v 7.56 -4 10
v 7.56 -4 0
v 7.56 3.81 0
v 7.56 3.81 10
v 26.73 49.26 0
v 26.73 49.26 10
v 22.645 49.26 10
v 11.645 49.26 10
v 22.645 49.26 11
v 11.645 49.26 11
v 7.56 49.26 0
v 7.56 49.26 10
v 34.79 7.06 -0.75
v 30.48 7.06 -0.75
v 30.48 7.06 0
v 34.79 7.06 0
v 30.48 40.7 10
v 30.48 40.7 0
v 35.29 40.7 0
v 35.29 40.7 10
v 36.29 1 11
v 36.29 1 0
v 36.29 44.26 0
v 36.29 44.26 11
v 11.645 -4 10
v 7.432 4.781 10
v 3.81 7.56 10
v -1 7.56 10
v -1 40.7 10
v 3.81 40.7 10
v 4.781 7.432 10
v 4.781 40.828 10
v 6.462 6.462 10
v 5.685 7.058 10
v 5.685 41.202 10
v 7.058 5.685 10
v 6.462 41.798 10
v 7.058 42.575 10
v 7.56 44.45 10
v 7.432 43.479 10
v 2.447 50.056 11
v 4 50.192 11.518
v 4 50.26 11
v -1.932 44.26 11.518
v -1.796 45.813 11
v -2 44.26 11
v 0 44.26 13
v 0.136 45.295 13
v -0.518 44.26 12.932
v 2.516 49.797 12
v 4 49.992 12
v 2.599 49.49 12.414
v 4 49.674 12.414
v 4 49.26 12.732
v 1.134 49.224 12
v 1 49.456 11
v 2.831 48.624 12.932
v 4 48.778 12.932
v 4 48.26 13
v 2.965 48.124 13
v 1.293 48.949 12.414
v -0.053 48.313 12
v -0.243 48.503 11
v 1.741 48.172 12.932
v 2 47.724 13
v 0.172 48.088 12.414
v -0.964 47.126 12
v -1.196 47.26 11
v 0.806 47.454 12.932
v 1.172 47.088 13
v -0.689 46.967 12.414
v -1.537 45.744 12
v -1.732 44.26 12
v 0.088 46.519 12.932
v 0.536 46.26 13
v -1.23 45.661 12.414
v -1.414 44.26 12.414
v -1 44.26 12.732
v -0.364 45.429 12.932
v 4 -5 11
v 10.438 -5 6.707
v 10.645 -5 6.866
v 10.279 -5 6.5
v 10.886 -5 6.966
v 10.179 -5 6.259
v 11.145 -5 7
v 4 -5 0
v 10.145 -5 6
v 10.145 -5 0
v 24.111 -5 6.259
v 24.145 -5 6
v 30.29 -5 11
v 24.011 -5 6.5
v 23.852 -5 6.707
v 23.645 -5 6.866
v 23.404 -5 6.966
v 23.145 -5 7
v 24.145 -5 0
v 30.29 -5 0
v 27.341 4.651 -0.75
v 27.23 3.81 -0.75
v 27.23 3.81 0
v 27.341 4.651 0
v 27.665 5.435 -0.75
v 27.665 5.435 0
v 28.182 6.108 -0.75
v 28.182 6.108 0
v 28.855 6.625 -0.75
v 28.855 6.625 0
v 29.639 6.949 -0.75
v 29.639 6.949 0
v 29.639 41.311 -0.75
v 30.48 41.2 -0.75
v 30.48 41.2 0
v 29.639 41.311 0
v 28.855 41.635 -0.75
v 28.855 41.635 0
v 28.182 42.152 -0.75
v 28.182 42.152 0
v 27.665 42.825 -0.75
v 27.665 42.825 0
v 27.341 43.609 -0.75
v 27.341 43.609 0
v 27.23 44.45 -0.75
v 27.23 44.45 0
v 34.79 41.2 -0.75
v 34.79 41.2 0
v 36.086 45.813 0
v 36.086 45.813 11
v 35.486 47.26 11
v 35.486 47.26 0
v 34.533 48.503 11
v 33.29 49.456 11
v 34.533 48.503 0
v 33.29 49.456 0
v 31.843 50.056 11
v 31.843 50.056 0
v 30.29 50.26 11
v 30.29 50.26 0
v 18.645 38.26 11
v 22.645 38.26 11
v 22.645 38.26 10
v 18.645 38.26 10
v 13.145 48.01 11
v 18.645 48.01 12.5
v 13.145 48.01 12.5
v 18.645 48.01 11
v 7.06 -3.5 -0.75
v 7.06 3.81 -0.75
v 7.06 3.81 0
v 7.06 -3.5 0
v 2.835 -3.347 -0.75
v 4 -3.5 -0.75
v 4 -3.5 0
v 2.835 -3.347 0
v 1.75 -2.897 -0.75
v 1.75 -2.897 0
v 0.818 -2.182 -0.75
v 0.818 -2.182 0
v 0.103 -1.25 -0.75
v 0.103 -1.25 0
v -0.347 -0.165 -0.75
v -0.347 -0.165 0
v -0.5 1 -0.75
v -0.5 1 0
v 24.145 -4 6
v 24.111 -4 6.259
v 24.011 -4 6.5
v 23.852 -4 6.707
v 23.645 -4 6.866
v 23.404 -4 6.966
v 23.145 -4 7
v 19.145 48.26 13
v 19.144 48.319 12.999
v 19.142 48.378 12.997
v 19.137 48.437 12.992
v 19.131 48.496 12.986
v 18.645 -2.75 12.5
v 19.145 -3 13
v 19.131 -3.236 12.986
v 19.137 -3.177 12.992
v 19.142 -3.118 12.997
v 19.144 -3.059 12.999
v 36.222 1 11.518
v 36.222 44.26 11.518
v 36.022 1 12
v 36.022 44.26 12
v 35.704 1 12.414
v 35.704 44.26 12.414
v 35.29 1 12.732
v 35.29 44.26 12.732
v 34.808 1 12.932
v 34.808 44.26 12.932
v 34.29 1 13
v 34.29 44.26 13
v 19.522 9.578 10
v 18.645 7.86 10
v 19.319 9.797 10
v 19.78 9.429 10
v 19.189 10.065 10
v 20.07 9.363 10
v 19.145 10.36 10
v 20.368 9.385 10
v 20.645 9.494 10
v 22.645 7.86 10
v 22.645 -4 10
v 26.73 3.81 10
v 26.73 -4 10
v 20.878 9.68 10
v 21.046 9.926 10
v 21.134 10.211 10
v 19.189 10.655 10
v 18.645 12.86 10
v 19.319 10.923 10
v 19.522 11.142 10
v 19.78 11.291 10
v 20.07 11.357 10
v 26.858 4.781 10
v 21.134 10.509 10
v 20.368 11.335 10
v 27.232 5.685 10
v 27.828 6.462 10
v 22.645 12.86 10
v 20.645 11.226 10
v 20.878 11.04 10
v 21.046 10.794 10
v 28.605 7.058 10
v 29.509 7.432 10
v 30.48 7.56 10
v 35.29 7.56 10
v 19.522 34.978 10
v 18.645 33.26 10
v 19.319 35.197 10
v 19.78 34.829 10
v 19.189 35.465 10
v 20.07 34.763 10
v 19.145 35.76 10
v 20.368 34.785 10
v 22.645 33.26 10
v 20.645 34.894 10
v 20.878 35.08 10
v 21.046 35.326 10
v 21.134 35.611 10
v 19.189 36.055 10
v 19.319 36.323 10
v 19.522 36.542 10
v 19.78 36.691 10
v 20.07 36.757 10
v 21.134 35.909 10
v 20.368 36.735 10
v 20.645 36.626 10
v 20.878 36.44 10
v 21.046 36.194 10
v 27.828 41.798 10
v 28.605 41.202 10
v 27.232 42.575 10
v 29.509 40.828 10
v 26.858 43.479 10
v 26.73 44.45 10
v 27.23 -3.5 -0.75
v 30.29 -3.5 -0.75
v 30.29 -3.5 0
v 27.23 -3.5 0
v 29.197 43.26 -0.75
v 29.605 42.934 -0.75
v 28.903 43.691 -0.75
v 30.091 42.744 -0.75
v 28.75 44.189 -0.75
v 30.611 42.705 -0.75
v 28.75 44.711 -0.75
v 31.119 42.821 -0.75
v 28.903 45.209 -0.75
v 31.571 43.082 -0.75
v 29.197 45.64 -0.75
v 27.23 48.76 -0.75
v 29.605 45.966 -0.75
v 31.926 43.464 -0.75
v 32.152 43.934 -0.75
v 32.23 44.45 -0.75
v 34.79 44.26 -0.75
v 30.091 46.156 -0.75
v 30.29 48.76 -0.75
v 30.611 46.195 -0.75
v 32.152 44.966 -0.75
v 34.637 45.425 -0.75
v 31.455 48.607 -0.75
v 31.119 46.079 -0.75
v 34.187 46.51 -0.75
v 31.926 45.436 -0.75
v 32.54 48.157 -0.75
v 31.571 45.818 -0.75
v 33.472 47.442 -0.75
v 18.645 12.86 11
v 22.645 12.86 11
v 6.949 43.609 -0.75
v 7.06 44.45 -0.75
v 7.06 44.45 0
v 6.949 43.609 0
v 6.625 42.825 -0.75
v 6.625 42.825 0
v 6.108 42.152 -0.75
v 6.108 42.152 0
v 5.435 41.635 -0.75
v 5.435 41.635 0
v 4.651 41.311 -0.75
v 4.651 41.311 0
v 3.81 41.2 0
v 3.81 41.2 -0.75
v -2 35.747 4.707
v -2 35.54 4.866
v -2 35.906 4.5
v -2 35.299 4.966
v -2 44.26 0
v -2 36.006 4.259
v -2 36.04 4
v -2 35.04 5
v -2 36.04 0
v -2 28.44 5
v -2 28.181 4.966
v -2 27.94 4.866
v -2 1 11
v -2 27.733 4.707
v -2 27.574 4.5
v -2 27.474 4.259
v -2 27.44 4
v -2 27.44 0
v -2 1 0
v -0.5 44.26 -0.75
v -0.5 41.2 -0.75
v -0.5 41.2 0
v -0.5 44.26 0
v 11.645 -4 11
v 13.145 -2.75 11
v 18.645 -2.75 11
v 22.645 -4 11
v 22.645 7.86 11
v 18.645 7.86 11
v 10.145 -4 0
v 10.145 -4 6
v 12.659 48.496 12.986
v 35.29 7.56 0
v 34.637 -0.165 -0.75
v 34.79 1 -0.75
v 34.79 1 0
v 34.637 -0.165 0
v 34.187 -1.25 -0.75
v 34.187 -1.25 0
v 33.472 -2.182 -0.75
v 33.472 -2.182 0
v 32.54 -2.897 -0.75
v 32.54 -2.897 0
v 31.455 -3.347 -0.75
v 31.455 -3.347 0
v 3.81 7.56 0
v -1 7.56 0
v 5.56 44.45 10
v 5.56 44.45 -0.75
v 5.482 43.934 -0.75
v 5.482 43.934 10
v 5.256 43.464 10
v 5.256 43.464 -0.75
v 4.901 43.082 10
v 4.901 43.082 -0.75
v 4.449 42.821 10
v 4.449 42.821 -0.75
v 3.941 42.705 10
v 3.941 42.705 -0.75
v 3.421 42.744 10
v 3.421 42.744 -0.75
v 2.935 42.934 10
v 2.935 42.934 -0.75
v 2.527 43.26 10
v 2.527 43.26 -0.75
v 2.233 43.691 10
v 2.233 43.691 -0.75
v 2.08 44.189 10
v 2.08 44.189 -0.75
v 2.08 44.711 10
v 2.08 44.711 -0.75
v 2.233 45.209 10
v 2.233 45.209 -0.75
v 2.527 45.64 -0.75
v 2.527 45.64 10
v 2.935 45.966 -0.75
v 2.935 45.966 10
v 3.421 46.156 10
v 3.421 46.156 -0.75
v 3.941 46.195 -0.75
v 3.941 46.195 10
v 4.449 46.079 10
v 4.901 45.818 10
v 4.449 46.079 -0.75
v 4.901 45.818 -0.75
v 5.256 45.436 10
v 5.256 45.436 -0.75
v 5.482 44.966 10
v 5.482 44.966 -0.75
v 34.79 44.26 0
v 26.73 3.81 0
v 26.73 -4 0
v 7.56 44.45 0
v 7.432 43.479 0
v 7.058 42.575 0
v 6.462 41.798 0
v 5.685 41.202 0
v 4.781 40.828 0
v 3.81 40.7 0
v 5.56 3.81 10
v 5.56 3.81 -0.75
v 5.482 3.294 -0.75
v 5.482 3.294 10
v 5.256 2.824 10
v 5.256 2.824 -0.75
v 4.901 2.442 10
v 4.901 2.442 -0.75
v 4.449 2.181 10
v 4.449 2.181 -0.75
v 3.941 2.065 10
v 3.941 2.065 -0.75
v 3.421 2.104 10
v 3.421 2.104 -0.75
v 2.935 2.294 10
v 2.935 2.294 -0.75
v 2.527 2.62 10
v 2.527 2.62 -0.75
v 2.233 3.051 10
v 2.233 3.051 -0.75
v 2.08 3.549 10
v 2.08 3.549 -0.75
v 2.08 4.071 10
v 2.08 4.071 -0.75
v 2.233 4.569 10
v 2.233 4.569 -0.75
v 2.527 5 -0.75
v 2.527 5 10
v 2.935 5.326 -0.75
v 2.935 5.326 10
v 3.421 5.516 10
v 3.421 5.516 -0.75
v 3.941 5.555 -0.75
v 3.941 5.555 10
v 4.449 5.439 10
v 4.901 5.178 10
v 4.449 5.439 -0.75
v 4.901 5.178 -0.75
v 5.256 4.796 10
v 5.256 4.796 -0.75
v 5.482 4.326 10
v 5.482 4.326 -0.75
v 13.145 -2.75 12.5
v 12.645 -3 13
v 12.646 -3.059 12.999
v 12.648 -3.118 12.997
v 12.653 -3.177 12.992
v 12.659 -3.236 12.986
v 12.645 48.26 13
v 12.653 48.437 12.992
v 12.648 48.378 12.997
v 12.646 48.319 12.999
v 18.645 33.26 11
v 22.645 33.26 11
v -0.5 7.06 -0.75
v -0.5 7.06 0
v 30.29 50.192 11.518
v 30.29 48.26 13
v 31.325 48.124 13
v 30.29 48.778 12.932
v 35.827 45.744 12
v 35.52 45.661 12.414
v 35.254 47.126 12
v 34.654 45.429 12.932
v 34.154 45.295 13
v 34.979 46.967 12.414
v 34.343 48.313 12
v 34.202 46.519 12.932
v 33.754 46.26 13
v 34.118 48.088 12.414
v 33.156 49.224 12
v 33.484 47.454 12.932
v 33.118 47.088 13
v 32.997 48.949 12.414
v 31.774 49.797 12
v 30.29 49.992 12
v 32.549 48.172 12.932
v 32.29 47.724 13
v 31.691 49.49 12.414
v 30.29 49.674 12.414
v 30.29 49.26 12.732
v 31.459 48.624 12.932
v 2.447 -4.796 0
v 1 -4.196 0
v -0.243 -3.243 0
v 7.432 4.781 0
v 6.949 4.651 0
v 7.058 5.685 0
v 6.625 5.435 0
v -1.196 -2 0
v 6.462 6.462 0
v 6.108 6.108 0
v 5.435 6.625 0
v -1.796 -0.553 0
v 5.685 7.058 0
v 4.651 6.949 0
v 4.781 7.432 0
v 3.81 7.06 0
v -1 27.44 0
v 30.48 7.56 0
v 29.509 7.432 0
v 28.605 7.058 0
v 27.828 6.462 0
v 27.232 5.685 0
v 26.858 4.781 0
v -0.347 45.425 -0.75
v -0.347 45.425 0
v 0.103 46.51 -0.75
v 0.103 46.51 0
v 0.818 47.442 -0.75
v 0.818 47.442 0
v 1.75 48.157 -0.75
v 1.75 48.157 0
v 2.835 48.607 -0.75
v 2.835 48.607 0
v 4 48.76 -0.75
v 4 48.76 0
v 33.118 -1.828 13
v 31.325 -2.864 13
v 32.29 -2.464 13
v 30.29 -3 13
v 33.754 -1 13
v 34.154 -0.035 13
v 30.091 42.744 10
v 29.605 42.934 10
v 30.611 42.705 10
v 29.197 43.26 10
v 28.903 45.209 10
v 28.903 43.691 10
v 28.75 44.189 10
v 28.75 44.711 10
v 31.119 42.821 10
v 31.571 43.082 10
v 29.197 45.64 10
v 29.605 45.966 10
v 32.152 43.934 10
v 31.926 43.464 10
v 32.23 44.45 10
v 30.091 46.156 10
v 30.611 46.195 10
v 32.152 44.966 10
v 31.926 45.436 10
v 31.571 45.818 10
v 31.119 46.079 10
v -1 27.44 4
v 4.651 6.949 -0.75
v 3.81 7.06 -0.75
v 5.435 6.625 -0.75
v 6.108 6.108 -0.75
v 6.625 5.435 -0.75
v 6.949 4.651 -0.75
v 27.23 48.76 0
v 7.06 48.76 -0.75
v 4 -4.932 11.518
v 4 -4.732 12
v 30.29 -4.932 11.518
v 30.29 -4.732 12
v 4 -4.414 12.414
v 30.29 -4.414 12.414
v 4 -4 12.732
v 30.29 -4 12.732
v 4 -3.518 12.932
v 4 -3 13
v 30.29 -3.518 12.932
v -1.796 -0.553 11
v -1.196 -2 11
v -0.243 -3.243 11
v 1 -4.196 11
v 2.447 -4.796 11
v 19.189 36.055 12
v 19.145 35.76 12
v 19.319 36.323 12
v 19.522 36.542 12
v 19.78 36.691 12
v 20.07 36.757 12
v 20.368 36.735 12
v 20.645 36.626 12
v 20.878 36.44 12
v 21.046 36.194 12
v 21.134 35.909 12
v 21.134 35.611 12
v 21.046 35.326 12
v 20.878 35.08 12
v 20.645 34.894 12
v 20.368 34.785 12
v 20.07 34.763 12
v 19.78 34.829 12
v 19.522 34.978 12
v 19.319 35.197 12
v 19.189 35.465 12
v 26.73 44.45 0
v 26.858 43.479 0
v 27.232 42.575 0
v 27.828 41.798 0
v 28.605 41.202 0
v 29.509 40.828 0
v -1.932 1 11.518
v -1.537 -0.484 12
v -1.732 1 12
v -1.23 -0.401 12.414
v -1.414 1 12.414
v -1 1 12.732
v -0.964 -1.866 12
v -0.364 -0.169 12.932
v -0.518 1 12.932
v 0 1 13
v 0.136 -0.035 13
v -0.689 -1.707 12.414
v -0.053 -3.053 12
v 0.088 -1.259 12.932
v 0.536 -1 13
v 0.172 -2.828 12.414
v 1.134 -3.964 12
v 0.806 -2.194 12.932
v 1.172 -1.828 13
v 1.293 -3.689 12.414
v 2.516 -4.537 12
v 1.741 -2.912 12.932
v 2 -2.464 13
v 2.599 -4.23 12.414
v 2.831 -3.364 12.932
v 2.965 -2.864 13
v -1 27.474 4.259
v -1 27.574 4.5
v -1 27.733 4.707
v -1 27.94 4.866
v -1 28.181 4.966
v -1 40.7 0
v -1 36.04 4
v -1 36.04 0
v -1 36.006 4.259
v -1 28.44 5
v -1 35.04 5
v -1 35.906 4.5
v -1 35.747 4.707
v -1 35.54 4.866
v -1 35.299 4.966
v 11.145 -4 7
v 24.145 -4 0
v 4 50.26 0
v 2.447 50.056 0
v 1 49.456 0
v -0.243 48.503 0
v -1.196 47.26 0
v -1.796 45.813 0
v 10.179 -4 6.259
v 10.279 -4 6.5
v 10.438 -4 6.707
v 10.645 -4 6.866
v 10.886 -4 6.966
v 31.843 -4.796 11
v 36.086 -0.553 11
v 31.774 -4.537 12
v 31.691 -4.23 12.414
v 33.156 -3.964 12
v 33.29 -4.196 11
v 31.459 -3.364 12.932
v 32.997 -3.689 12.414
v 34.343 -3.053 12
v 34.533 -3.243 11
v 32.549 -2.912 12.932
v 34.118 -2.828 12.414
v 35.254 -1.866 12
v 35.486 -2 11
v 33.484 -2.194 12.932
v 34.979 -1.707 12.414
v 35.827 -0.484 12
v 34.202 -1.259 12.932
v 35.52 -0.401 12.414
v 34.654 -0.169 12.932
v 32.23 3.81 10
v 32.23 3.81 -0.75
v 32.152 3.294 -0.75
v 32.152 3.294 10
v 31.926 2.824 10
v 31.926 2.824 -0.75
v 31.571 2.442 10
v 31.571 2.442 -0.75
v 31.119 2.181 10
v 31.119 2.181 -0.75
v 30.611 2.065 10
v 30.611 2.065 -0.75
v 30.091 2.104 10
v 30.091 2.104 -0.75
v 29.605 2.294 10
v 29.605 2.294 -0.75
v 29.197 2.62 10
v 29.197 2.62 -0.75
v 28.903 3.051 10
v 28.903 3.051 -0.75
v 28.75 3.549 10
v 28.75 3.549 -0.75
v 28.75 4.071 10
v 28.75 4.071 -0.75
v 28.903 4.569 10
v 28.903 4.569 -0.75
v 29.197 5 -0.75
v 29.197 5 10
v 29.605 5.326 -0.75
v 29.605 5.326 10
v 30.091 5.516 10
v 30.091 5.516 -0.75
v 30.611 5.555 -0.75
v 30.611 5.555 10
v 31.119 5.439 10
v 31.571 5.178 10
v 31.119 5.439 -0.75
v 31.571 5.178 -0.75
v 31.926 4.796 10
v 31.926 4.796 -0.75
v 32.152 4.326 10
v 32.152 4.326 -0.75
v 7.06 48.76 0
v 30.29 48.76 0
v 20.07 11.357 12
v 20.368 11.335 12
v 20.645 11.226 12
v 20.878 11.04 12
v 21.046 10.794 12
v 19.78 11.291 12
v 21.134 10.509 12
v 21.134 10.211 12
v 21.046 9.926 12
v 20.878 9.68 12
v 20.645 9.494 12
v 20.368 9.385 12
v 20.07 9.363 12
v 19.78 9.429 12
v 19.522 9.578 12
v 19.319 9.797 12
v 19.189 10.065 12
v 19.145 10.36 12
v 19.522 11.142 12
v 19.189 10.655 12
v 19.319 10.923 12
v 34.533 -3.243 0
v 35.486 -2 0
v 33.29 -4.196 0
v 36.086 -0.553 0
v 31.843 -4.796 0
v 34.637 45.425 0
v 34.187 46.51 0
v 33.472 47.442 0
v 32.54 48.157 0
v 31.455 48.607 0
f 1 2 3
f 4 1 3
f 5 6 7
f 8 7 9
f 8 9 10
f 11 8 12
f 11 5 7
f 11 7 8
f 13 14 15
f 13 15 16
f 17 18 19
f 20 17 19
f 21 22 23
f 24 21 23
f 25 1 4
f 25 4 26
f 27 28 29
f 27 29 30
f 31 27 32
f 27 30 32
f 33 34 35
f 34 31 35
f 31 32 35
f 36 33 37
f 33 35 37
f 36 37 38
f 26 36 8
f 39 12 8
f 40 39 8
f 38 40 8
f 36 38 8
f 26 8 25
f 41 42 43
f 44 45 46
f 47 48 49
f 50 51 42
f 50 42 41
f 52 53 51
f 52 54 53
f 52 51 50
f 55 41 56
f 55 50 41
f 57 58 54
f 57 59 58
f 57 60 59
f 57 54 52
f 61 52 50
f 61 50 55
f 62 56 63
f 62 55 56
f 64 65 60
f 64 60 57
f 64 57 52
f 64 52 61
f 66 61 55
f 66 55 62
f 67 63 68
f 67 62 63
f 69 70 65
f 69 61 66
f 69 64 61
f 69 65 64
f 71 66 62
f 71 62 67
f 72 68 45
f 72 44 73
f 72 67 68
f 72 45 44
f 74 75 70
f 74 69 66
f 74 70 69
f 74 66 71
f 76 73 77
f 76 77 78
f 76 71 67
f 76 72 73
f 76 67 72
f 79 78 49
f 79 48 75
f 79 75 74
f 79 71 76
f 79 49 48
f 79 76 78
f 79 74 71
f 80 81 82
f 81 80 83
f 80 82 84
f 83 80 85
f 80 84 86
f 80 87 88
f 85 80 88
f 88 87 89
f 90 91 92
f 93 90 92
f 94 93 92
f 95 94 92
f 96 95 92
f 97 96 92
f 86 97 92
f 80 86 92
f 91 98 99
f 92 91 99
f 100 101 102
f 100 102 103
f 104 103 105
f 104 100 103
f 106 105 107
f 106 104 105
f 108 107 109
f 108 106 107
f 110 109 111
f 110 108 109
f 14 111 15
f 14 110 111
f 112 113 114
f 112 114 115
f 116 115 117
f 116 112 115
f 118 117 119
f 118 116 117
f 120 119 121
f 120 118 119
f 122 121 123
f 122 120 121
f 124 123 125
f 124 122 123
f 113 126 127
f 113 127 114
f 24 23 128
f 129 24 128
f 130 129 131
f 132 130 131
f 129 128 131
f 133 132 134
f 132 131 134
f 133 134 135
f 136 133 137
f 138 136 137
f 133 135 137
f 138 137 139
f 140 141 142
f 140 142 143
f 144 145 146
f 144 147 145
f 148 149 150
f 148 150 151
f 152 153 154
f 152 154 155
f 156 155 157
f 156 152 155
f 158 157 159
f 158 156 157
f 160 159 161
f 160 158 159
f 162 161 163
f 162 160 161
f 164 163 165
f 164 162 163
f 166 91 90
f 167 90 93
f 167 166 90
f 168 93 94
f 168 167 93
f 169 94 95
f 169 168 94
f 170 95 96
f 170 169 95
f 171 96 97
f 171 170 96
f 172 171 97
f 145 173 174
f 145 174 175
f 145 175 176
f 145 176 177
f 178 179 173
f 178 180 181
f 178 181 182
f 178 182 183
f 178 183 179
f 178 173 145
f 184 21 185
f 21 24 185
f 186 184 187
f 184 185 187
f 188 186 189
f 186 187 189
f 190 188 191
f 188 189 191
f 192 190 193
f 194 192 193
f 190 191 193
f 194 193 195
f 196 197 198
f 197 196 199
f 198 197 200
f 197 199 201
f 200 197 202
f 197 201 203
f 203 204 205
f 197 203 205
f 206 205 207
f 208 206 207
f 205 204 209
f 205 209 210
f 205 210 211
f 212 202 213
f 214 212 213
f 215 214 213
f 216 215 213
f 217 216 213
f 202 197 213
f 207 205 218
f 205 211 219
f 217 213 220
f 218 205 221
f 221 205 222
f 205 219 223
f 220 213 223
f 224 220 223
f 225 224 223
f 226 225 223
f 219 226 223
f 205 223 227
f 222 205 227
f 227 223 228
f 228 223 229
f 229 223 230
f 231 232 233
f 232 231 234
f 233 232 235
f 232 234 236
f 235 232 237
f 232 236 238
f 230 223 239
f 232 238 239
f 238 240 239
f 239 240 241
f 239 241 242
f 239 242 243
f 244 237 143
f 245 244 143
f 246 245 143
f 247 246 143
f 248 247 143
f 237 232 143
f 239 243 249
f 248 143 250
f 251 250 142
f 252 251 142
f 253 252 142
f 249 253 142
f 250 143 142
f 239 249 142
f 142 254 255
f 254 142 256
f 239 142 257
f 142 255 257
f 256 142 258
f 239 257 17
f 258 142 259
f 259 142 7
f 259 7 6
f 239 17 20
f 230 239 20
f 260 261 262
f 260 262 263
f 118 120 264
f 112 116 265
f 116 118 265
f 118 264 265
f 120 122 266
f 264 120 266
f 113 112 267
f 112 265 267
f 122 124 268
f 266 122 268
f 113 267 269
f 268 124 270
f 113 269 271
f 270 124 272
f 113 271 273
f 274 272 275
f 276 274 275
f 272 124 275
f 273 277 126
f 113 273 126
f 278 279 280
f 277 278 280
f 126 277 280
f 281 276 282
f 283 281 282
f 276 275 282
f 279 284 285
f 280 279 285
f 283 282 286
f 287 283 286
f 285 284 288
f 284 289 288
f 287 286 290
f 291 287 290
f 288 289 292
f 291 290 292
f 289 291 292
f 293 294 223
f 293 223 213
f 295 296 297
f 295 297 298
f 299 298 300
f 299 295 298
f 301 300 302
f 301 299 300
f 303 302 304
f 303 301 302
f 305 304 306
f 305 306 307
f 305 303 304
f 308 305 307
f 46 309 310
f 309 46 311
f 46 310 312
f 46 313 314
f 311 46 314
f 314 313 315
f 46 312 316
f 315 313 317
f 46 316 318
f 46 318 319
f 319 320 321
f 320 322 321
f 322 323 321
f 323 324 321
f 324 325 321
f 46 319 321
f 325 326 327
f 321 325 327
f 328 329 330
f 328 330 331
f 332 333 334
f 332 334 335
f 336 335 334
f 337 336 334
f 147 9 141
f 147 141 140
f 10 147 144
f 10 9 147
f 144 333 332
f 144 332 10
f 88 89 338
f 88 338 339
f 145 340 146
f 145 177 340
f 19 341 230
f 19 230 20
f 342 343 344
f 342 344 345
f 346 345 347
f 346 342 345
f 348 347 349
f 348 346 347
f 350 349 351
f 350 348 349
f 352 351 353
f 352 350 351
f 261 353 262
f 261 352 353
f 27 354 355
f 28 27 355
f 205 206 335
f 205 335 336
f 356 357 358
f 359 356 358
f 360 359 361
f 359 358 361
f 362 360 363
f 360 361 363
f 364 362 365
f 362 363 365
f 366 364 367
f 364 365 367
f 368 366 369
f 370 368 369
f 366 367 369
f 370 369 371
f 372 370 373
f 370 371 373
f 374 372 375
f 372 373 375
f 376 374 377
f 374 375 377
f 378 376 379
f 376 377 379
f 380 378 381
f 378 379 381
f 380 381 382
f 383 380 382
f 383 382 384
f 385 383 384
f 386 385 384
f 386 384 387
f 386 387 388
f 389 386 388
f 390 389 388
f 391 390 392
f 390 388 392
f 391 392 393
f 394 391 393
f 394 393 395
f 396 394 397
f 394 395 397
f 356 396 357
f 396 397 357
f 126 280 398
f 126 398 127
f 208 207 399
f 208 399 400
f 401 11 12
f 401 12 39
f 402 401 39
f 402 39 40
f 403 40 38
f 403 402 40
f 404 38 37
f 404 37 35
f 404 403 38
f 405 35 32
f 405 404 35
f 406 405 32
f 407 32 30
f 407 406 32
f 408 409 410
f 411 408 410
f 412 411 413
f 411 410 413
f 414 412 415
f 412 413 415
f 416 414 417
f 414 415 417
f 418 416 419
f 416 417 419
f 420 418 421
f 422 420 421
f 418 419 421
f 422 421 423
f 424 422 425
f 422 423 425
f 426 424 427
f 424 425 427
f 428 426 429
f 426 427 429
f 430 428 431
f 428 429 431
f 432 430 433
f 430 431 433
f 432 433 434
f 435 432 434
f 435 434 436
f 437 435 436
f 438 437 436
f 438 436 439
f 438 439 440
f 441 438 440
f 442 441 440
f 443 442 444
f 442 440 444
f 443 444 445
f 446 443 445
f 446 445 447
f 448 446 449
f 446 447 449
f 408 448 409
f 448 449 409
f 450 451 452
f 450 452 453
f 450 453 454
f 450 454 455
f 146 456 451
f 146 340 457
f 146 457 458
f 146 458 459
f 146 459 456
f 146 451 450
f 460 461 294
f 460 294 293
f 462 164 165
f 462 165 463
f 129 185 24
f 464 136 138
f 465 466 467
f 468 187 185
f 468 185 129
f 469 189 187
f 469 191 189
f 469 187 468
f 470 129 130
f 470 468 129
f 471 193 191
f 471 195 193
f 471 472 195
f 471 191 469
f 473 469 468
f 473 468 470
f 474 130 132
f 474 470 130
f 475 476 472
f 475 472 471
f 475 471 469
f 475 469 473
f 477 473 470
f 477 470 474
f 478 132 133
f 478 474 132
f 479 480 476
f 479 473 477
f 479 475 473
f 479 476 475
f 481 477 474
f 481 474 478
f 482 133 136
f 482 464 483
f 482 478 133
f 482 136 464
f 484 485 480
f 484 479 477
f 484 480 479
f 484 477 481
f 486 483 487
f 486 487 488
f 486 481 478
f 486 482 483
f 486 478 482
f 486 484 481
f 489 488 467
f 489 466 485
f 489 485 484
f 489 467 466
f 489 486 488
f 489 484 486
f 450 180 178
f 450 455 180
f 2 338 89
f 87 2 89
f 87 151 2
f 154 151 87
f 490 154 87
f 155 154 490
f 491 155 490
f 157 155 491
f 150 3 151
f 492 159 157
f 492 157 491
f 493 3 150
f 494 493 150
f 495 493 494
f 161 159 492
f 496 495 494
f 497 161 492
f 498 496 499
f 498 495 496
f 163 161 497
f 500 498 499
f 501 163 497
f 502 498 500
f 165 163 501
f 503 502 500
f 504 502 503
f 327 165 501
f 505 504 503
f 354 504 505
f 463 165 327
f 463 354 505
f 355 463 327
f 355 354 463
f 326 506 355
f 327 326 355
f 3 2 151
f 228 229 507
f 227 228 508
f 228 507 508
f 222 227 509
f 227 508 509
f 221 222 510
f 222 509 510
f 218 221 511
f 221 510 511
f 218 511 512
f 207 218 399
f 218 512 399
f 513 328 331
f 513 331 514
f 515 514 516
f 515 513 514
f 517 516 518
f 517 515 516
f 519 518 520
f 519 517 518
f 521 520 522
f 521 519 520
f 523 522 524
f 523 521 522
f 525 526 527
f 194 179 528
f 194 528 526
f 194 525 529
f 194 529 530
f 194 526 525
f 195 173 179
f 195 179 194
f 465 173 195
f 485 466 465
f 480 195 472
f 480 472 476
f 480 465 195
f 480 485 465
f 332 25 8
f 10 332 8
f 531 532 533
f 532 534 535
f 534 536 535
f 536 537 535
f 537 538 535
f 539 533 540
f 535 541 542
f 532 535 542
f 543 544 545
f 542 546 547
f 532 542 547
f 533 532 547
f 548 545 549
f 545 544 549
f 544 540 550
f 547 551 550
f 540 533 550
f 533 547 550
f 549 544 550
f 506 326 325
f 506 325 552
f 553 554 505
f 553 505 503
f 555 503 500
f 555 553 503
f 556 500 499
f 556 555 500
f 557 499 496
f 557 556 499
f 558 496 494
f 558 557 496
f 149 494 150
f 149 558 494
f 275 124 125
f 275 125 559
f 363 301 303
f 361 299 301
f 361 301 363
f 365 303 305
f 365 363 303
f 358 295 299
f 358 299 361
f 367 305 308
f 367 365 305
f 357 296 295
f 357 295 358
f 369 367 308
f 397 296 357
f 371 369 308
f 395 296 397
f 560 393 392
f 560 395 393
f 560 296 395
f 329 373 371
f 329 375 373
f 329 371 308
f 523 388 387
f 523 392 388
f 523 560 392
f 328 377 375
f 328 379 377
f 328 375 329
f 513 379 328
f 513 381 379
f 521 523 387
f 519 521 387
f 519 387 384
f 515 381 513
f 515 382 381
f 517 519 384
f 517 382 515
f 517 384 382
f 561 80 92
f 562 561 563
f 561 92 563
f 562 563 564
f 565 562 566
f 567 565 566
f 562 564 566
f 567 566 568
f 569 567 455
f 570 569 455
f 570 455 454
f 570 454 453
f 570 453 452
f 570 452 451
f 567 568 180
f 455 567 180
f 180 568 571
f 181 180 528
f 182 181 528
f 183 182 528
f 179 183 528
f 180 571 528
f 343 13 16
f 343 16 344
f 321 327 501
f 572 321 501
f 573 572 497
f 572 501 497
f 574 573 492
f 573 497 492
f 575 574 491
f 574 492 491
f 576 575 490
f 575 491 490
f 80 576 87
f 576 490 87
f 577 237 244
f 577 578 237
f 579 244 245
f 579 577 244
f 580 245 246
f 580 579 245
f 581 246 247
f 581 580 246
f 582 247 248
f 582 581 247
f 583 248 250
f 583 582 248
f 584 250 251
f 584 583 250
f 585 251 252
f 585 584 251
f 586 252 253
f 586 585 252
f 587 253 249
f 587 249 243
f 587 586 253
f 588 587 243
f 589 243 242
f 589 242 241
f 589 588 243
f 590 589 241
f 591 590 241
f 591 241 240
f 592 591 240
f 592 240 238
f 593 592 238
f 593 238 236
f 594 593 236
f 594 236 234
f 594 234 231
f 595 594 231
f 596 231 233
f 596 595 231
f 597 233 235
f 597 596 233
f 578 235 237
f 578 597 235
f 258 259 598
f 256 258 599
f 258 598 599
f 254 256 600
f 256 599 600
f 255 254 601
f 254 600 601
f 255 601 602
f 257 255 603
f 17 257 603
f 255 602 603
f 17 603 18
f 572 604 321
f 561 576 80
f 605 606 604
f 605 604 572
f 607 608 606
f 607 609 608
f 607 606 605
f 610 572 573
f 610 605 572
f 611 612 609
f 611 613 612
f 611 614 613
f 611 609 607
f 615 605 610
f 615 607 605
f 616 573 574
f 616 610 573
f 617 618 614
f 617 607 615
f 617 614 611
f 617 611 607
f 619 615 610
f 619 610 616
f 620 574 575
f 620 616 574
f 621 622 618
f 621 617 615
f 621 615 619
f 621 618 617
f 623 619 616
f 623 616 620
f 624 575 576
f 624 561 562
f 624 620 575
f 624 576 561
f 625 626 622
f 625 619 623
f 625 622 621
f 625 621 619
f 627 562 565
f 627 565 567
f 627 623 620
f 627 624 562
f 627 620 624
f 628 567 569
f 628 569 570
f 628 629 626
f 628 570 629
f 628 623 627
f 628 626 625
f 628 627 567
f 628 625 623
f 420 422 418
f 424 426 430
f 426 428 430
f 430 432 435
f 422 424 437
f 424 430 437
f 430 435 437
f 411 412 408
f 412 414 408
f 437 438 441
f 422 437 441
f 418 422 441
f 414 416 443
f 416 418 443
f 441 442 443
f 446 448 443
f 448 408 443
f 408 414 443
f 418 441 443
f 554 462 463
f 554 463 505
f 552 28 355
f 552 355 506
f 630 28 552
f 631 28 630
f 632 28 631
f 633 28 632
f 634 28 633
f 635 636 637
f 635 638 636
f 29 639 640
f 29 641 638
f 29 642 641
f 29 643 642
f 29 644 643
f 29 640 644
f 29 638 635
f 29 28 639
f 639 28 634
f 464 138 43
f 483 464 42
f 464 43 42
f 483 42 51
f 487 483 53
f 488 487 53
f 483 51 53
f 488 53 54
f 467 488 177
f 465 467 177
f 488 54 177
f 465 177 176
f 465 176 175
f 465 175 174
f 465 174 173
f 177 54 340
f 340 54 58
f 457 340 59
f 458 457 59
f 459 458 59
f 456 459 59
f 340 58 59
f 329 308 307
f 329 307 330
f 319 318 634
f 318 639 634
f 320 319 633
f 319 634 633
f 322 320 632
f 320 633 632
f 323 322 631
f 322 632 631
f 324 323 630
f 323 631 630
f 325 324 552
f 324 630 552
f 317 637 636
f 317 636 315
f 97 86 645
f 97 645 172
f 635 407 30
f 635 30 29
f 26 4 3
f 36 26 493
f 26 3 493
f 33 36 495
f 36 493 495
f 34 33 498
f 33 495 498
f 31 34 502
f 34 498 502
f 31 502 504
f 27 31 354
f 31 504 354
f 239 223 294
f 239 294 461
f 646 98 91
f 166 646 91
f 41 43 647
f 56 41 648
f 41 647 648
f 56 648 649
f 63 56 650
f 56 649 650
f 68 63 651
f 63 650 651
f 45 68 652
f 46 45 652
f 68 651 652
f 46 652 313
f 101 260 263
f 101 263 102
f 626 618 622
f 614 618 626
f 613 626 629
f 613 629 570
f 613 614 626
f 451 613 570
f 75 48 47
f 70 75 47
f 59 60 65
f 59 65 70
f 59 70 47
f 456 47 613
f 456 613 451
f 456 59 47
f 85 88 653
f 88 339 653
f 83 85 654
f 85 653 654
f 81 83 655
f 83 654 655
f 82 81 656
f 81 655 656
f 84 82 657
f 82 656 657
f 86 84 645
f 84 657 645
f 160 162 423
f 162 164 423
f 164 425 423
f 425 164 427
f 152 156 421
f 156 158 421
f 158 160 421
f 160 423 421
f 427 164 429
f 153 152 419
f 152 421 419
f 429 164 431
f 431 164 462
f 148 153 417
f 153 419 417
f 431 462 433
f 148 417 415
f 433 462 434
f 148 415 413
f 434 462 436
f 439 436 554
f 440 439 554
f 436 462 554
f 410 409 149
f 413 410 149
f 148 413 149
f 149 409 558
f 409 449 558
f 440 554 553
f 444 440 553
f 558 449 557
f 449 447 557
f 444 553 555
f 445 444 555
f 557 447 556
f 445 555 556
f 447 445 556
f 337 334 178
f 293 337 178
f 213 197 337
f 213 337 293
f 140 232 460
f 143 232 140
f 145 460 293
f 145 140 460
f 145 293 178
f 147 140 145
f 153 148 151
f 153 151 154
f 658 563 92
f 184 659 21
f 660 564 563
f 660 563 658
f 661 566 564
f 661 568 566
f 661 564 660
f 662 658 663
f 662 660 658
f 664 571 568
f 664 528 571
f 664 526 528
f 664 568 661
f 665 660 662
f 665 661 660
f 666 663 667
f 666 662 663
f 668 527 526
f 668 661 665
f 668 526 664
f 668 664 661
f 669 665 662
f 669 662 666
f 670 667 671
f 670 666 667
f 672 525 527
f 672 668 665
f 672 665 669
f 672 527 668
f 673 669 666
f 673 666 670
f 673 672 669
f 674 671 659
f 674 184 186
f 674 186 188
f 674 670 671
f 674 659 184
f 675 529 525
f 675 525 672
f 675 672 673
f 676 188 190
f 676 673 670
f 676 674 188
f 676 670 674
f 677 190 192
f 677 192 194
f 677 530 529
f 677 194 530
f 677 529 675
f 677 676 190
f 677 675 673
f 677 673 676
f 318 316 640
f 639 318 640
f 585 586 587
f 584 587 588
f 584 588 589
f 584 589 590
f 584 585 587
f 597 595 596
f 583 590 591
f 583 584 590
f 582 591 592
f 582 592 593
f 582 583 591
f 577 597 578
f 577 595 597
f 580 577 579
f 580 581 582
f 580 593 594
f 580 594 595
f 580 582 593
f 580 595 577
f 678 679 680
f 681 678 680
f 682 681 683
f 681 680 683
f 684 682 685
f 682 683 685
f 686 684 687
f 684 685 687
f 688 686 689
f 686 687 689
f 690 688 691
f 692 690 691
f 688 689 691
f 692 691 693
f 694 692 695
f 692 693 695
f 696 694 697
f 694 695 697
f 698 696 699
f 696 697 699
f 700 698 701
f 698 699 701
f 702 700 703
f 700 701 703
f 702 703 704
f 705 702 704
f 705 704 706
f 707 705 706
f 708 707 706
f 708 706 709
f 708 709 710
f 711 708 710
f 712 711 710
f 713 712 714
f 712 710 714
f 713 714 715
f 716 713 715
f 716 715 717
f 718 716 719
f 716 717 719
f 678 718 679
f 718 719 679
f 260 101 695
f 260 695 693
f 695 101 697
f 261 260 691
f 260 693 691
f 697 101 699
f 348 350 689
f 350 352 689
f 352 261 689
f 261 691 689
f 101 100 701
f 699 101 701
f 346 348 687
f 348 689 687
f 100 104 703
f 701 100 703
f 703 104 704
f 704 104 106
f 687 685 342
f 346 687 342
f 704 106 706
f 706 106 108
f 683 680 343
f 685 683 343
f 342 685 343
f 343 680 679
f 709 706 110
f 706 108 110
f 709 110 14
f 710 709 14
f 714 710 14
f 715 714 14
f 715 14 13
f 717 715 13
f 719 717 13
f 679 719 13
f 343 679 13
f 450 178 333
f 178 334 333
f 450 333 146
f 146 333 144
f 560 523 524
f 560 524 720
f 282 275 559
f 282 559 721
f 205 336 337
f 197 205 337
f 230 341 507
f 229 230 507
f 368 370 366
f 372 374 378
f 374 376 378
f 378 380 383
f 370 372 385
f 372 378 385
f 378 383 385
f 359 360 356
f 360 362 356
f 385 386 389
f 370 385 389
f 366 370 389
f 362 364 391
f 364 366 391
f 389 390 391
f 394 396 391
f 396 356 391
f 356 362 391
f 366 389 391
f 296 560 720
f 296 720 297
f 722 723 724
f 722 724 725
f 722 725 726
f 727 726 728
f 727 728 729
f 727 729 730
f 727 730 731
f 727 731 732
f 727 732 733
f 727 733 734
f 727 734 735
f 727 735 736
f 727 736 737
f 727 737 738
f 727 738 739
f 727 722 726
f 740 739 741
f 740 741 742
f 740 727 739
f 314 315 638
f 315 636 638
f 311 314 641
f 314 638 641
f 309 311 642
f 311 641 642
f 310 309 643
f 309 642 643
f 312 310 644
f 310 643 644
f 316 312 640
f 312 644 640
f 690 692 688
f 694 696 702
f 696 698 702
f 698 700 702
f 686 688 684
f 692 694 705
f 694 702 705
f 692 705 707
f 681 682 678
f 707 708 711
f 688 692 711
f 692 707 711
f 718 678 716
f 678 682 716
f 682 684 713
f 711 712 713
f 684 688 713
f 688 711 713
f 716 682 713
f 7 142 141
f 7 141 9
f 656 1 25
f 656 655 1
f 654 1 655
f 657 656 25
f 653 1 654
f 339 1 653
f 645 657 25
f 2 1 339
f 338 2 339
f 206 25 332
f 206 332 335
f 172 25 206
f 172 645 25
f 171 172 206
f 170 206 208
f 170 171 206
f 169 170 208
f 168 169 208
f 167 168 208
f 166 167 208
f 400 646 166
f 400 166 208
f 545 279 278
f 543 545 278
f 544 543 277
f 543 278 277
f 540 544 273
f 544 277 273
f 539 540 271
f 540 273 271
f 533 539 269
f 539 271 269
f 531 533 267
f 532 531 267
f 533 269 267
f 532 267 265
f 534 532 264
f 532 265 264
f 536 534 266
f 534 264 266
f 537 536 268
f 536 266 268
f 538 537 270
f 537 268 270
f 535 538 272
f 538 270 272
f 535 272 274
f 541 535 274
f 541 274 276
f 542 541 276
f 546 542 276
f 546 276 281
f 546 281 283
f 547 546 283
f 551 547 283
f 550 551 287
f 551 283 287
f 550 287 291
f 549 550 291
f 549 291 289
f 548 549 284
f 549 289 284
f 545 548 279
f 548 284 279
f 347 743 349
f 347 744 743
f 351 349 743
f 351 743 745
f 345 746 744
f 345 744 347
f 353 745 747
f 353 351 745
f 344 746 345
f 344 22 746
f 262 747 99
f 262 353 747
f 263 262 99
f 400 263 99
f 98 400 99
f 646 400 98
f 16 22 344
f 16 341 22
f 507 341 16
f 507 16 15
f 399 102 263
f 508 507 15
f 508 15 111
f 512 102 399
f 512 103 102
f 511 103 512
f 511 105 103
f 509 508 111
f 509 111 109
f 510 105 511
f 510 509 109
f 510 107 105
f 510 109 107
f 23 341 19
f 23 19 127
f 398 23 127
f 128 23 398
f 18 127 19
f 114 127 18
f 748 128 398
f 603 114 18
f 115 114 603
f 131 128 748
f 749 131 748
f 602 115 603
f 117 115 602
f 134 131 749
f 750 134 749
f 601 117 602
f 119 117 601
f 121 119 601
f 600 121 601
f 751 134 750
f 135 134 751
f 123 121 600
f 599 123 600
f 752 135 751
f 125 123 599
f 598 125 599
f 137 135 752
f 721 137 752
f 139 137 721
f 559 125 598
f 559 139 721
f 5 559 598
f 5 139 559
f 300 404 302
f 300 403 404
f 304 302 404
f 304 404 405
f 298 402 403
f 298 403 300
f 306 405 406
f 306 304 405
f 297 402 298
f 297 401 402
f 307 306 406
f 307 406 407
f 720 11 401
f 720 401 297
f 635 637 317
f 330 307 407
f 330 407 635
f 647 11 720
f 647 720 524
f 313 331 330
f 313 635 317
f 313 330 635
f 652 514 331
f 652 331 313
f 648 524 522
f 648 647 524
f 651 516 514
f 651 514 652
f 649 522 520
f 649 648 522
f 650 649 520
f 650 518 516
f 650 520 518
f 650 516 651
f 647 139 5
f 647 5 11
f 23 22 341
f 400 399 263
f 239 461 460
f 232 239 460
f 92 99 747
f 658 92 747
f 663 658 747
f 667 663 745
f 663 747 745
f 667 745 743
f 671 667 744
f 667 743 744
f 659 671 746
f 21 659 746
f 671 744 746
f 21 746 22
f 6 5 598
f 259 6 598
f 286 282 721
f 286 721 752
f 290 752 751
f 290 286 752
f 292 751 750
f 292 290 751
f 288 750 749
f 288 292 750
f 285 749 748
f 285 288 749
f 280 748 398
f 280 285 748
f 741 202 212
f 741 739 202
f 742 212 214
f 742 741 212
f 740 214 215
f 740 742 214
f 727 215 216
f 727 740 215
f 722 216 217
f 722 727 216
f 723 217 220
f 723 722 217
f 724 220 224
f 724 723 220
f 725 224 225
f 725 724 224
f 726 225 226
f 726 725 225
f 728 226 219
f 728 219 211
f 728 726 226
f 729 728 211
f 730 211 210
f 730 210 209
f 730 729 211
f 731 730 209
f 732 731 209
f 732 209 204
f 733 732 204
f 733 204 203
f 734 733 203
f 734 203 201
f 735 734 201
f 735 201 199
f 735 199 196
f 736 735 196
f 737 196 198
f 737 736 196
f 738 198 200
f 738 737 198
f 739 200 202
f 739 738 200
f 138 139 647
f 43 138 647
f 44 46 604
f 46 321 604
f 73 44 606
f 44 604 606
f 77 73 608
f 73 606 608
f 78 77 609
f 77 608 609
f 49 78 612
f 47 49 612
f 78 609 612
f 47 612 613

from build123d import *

# Parameters (mm, degrees)
BOSS_EXTRUDE1_DEPTH = 10
SKETCH12_W          = 1
SKETCH12_H          = 8.6
BOSS_EXTRUDE8_DEPTH = 5
BOSS_EXTRUDE5_DEPTH = 3
BOSS_EXTRUDE6_START = 10.75
SKETCH10_R          = 1.75
BOSS_EXTRUDE6_DEPTH = 10.75
SKETCH11_W          = 14.1
SKETCH11_H          = 1
BOSS_EXTRUDE7_DEPTH = 1.5
FILLET1_R           = 2
CUT_EXTRUDE2_REACH  = 69.377
SKETCH13_W          = 14
SKETCH13_H          = 7
FILLET2_R           = 1
SKETCH14_W          = 11
SKETCH14_H          = 53.26
CUT_EXTRUDE3_DEPTH  = 1
SKETCH15_W          = 5.5
SKETCH15_H          = 50.76
CUT_EXTRUDE4_DEPTH  = 64.095912704
SKETCH17_W          = 4
SKETCH17_H          = 5
SKETCH17_R          = 1
BOSS_EXTRUDE9_DEPTH = 1
CHAMFER1_SIZE       = 0.5
CUT_EXTRUDE5_START  = -1
SKETCH18_R          = 1
CUT_EXTRUDE5_DEPTH  = 1
CUT_EXTRUDE7_DEPTH  = 0.75


with BuildPart() as part:
    # Sketch1 → Boss-Extrude1 (new body)
    with BuildSketch(Plane.XY):
        with BuildLine():
            Line((-1, 27.44), (-1, 1))
            ThreePointArc((-1, 1), (0.464466094, -2.535533906), (4, -4))
            Line((4, -4), (30.29, -4))
            ThreePointArc((30.29, -4), (33.825533906, -2.535533906), (35.29, 1))
            Line((35.29, 1), (35.29, 44.26))
            ThreePointArc((35.29, 44.26), (33.825533906, 47.795533906), (30.29, 49.26))
            Line((30.29, 49.26), (4, 49.26))
            ThreePointArc((4, 49.26), (0.464466094, 47.795533906), (-1, 44.26))
            Line((-1, 44.26), (-1, 36.04))
            Line((-1, 36.04), (-2, 36.04))
            Line((-2, 36.04), (-2, 44.26))
            ThreePointArc((-2, 44.26), (-0.242640687, 48.502640687), (4, 50.26))
            Line((4, 50.26), (30.29, 50.26))
            ThreePointArc((30.29, 50.26), (34.532640687, 48.502640687), (36.29, 44.26))
            Line((36.29, 44.26), (36.29, 1))
            ThreePointArc((36.29, 1), (34.532640687, -3.242640687), (30.29, -5))
            Line((30.29, -5), (4, -5))
            ThreePointArc((4, -5), (-0.242640687, -3.242640687), (-2, 1))
            Line((-2, 1), (-2, 27.44))
            Line((-2, 27.44), (-1, 27.44))
        make_face()
    extrude(amount=BOSS_EXTRUDE1_DEPTH)

    # Sketch12 → Boss-Extrude8 (add)
    with BuildSketch(Plane.XY.offset(10)):
        with Locations((-1.5, 31.74)):
            Rectangle(SKETCH12_W, SKETCH12_H)
    extrude(amount=-BOSS_EXTRUDE8_DEPTH)

    # Sketch8 → Boss-Extrude5 (add)
    with BuildSketch(Plane.XY.offset(10)):
        with BuildLine():
            Line((-2, 44.26), (-2, 1))
            ThreePointArc((-2, 1), (-0.242640687, -3.242640687), (4, -5))
            Line((4, -5), (30.29, -5))
            ThreePointArc((30.29, -5), (34.532640687, -3.242640687), (36.29, 1))
            Line((36.29, 1), (36.29, 44.26))
            ThreePointArc((36.29, 44.26), (34.532640687, 48.502640687), (30.29, 50.26))
            Line((30.29, 50.26), (4, 50.26))
            ThreePointArc((4, 50.26), (-0.242640687, 48.502640687), (-2, 44.26))
        make_face()
    extrude(amount=BOSS_EXTRUDE5_DEPTH)

    # Sketch10 → Boss-Extrude6 (add)
    # profile 1 of 4: a face of its own
    with BuildSketch(Plane(origin=(0, 0, 10), x_dir=(-1, 0, 0), z_dir=(0, 0, -1)).offset(BOSS_EXTRUDE6_START)):
        with BuildLine():
            Line((-30.29, 49.26), (-26.73, 49.26))
            Line((-26.73, 49.26), (-26.73, 44.45))
            ThreePointArc((-26.73, 44.45), (-27.828349571, 41.798349571), (-30.48, 40.7))
            Line((-30.48, 40.7), (-35.29, 40.7))
            Line((-35.29, 40.7), (-35.29, 44.26))
            ThreePointArc((-35.29, 44.26), (-33.825533906, 47.795533906), (-30.29, 49.26))
        make_face()
        with Locations(Location((-30.48, 44.45, 0), (0, 0, 180))):
            Circle(SKETCH10_R, mode=Mode.SUBTRACT)
    # profile 2 of 4: a face of its own
    with BuildSketch(Plane(origin=(0, 0, 10), x_dir=(-1, 0, 0), z_dir=(0, 0, -1)).offset(BOSS_EXTRUDE6_START)):
        with BuildLine():
            Line((-3.81, 40.7), (1, 40.7))
            Line((1, 40.7), (1, 44.26))
            ThreePointArc((1, 44.26), (-0.464466094, 47.795533906), (-4, 49.26))
            Line((-4, 49.26), (-7.56, 49.26))
            Line((-7.56, 49.26), (-7.56, 44.45))
            ThreePointArc((-7.56, 44.45), (-6.461650429, 41.798349571), (-3.81, 40.7))
        make_face()
        with Locations(Location((-3.81, 44.45, 0), (0, 0, 180))):
            Circle(SKETCH10_R, mode=Mode.SUBTRACT)
    # profile 3 of 4: a face of its own
    with BuildSketch(Plane(origin=(0, 0, 10), x_dir=(-1, 0, 0), z_dir=(0, 0, -1)).offset(BOSS_EXTRUDE6_START)):
        with BuildLine():
            Line((1, 7.56), (1, 1))
            ThreePointArc((1, 1), (-0.464466094, -2.535533906), (-4, -4))
            Line((-4, -4), (-7.56, -4))
            Line((-7.56, -4), (-7.56, 3.81))
            ThreePointArc((-7.56, 3.81), (-6.461650429, 6.461650429), (-3.81, 7.56))
            Line((-3.81, 7.56), (1, 7.56))
        make_face()
        with Locations(Location((-3.81, 3.81, 0), (0, 0, 180))):
            Circle(SKETCH10_R, mode=Mode.SUBTRACT)
    # profile 4 of 4: a face of its own
    with BuildSketch(Plane(origin=(0, 0, 10), x_dir=(-1, 0, 0), z_dir=(0, 0, -1)).offset(BOSS_EXTRUDE6_START)):
        with BuildLine():
            Line((-26.73, -4), (-30.29, -4))
            ThreePointArc((-30.29, -4), (-33.825533906, -2.535533906), (-35.29, 1))
            Line((-35.29, 1), (-35.29, 7.56))
            Line((-35.29, 7.56), (-30.48, 7.56))
            ThreePointArc((-30.48, 7.56), (-27.828349571, 6.461650429), (-26.73, 3.81))
            Line((-26.73, 3.81), (-26.73, -4))
        make_face()
        with Locations(Location((-30.48, 3.81, 0), (0, 0, 180))):
            Circle(SKETCH10_R, mode=Mode.SUBTRACT)
    extrude(amount=-BOSS_EXTRUDE6_DEPTH)

    # Sketch11 → Boss-Extrude7 (add)
    with BuildSketch(Plane(origin=(0, 0, 10), x_dir=(-1, 0, 0), z_dir=(0, 0, -1))):
        with Locations((-17.145, -4.5)):
            Rectangle(SKETCH11_W, SKETCH11_H)
    extrude(amount=BOSS_EXTRUDE7_DEPTH)

    # Fillet1
    fillet1_edges = [part.edges().sort_by_distance(p)[0] for p in [
        (17.145, -5, 13),
        (36.29, 22.63, 13),
        (34.532640687, 48.502640687, 13),
        (17.145, 50.26, 13),
        (-0.242640687, 48.502640687, 13),
        (-2, 22.63, 13),
        (-0.242640687, -3.242640687, 13),
        (34.532640687, -3.242640687, 13),
    ]]
    fillet(fillet1_edges, radius=FILLET1_R)

    # Sketch13 → Cut-Extrude2 (cut, up to next)
    with BuildSketch(Plane.XZ.offset(5), mode=Mode.PRIVATE) as cut_extrude2_sk1:
        with Locations((17.145, 3.5)):
            Rectangle(SKETCH13_W, SKETCH13_H)
    cut_extrude2_tool1 = extrude(cut_extrude2_sk1.sketch, amount=-CUT_EXTRUDE2_REACH, mode=Mode.PRIVATE) & part.part
    add(cut_extrude2_tool1.solids().sort_by_distance((17.145, -5, 3.5))[0], mode=Mode.SUBTRACT)

    # Fillet2
    fillet2_edges = [part.edges().sort_by_distance(p)[0] for p in [
        (-1.5, 36.04, 5),
        (-1.5, 27.44, 5),
        (10.145, -4.5, 7),
        (24.145, -4.5, 7),
    ]]
    fillet(fillet2_edges, radius=FILLET2_R)

    # Sketch14 → Cut-Extrude3 (cut)
    with BuildSketch(Plane(origin=(0, 0, 10), x_dir=(-1, 0, 0), z_dir=(0, 0, -1))):
        with Locations((-17.145, 22.63)):
            Rectangle(SKETCH14_W, SKETCH14_H)
    extrude(amount=-CUT_EXTRUDE3_DEPTH, mode=Mode.SUBTRACT)

    # Sketch15 → Cut-Extrude4 (cut, through all)
    with BuildSketch(Plane(origin=(0, 0, 11), x_dir=(-1, 0, 0), z_dir=(0, 0, -1))):
        with Locations((-15.895, 22.63)):
            Rectangle(SKETCH15_W, SKETCH15_H)
    extrude(amount=-CUT_EXTRUDE4_DEPTH, mode=Mode.SUBTRACT)

    # Sketch17 → Boss-Extrude9 (add)
    # profile 1 of 2: a face of its own
    with BuildSketch(Plane(origin=(0, 0, 11), x_dir=(-1, 0, 0), z_dir=(0, 0, -1))):
        with Locations((-20.645, 10.36)):
            Rectangle(SKETCH17_W, SKETCH17_H)
        with Locations((-20.145, 10.36)):
            Circle(SKETCH17_R, mode=Mode.SUBTRACT)
    # profile 2 of 2: a face of its own
    with BuildSketch(Plane(origin=(0, 0, 11), x_dir=(-1, 0, 0), z_dir=(0, 0, -1))):
        with Locations((-20.645, 35.76)):
            Rectangle(SKETCH17_W, SKETCH17_H)
        with Locations((-20.145, 35.76)):
            Circle(SKETCH17_R, mode=Mode.SUBTRACT)
    extrude(amount=BOSS_EXTRUDE9_DEPTH)

    # Chamfer1
    # the kernel refuses this chamfer: 0.5 mm, written as the material it takes off along each edge
    with BuildSketch(Plane(origin=(13.145, 48.01, 13), x_dir=(-0.9996219169112968, 0, 0.027495876610585647), z_dir=(0, -1, 0)), Plane(origin=(18.645, -2.75, 13), x_dir=(0.9996219169112968, 0, 0.02749587661058555), z_dir=(0, 1, 0))) as chamfer1_piece_1:
        Polygon((CHAMFER1_SIZE * 0.999621916911, CHAMFER1_SIZE * 0.0274958766106), (-CHAMFER1_SIZE * 0.0274958766106, CHAMFER1_SIZE * 0.999621916911), (0, 0), align=None)
    extrude(amount=50.76, mode=Mode.SUBTRACT)
    with BuildSketch(Plane(origin=(13.145, -2.75, 13), x_dir=(0, -0.9996219169112968, 0.0274958766105856), z_dir=(1, 0, 0)), Plane(origin=(18.645, 48.01, 13), x_dir=(0, 0.9996219169112968, 0.02749587661058574), z_dir=(-1, 0, 0))) as chamfer1_piece_2:
        Polygon((CHAMFER1_SIZE * 0.999621916911, CHAMFER1_SIZE * 0.0274958766106), (-CHAMFER1_SIZE * 0.0274958766106, CHAMFER1_SIZE * 0.999621916911), (0, 0), align=None)
    extrude(amount=5.5, mode=Mode.SUBTRACT)
    with BuildSketch(Plane(origin=(18.645, 48.01, 13), x_dir=(0, 0.9996219169112968, 0.02749587661058574), z_dir=(-1, 0, 0))) as chamfer1_piece_3a_section:
        Polygon((CHAMFER1_SIZE * 0.999621916911, CHAMFER1_SIZE * 0.0274958766106), (-CHAMFER1_SIZE * 0.0274958766106, CHAMFER1_SIZE * 0.999621916911), (0, 0), align=None)
    chamfer1_piece_3a = extrude(amount=6.785841494, mode=Mode.PRIVATE)
    chamfer1_piece_3a = split(chamfer1_piece_3a, bisect_by=Plane(origin=(13.145, 48.174896813, 12.835103187), z_dir=(-1, 0, 0)), keep=Keep.TOP, mode=Mode.PRIVATE)
    with BuildSketch(Plane(origin=(13.145, 49.295841494, 13), x_dir=(-0.9996219169112968, 0, 0.027495876610585647), z_dir=(0, -1, 0))) as chamfer1_piece_3b_section:
        Polygon((CHAMFER1_SIZE * 0.999621916911, CHAMFER1_SIZE * 0.0274958766106), (-CHAMFER1_SIZE * 0.0274958766106, CHAMFER1_SIZE * 0.999621916911), (0, 0), align=None)
    chamfer1_piece_3b = extrude(amount=52.045841494, mode=Mode.PRIVATE)
    chamfer1_piece_3b = split(chamfer1_piece_3b, bisect_by=Plane(origin=(12.980103187, 48.01, 12.835103187), z_dir=(0, 1, 0)), keep=Keep.TOP, mode=Mode.PRIVATE)
    chamfer1_piece_3 = chamfer1_piece_3a & chamfer1_piece_3b
    add(chamfer1_piece_3, mode=Mode.SUBTRACT)
    with BuildSketch(Plane(origin=(13.145, 48.01, 13), x_dir=(-0.9996219169112968, 0, 0.027495876610585647), z_dir=(0, -1, 0))) as chamfer1_piece_4a_section:
        Polygon((CHAMFER1_SIZE * 0.999621916911, CHAMFER1_SIZE * 0.0274958766106), (-CHAMFER1_SIZE * 0.0274958766106, CHAMFER1_SIZE * 0.999621916911), (0, 0), align=None)
    chamfer1_piece_4a = extrude(amount=52.045841494, mode=Mode.PRIVATE)
    chamfer1_piece_4a = split(chamfer1_piece_4a, bisect_by=Plane(origin=(12.980103187, -2.75, 12.835103187), z_dir=(0, -1, 0)), keep=Keep.TOP, mode=Mode.PRIVATE)
    with BuildSketch(Plane(origin=(11.859158506, -2.75, 13), x_dir=(0, -0.9996219169112968, 0.027495876610585623), z_dir=(1, 0, 0))) as chamfer1_piece_4b_section:
        Polygon((CHAMFER1_SIZE * 0.999621916911, CHAMFER1_SIZE * 0.0274958766106), (-CHAMFER1_SIZE * 0.0274958766106, CHAMFER1_SIZE * 0.999621916911), (0, 0), align=None)
    chamfer1_piece_4b = extrude(amount=6.785841494, mode=Mode.PRIVATE)
    chamfer1_piece_4b = split(chamfer1_piece_4b, bisect_by=Plane(origin=(13.145, -2.914896813, 12.835103187), z_dir=(-1, 0, 0)), keep=Keep.TOP, mode=Mode.PRIVATE)
    chamfer1_piece_4 = chamfer1_piece_4a & chamfer1_piece_4b
    add(chamfer1_piece_4, mode=Mode.SUBTRACT)
    with BuildSketch(Plane(origin=(13.145, -2.75, 13), x_dir=(0, -0.9996219169112968, 0.0274958766105856), z_dir=(1, 0, 0))) as chamfer1_piece_5a_section:
        Polygon((CHAMFER1_SIZE * 0.999621916911, CHAMFER1_SIZE * 0.0274958766106), (-CHAMFER1_SIZE * 0.0274958766106, CHAMFER1_SIZE * 0.999621916911), (0, 0), align=None)
    chamfer1_piece_5a = extrude(amount=6.785841494, mode=Mode.PRIVATE)
    chamfer1_piece_5a = split(chamfer1_piece_5a, bisect_by=Plane(origin=(18.645, -2.914896813, 12.835103187), z_dir=(1, 0, 0)), keep=Keep.TOP, mode=Mode.PRIVATE)
    with BuildSketch(Plane(origin=(18.645, -4.035841494, 13), x_dir=(0.9996219169112968, 0, 0.02749587661058555), z_dir=(0, 1, 0))) as chamfer1_piece_5b_section:
        Polygon((CHAMFER1_SIZE * 0.999621916911, CHAMFER1_SIZE * 0.0274958766106), (-CHAMFER1_SIZE * 0.0274958766106, CHAMFER1_SIZE * 0.999621916911), (0, 0), align=None)
    chamfer1_piece_5b = extrude(amount=52.045841494, mode=Mode.PRIVATE)
    chamfer1_piece_5b = split(chamfer1_piece_5b, bisect_by=Plane(origin=(18.809896813, -2.75, 12.835103187), z_dir=(0, -1, 0)), keep=Keep.TOP, mode=Mode.PRIVATE)
    chamfer1_piece_5 = chamfer1_piece_5a & chamfer1_piece_5b
    add(chamfer1_piece_5, mode=Mode.SUBTRACT)
    with BuildSketch(Plane(origin=(19.930841494, 48.01, 13), x_dir=(0, 0.9996219169112968, 0.02749587661058574), z_dir=(-1, 0, 0))) as chamfer1_piece_6a_section:
        Polygon((CHAMFER1_SIZE * 0.999621916911, CHAMFER1_SIZE * 0.0274958766106), (-CHAMFER1_SIZE * 0.0274958766106, CHAMFER1_SIZE * 0.999621916911), (0, 0), align=None)
    chamfer1_piece_6a = extrude(amount=6.785841494, mode=Mode.PRIVATE)
    chamfer1_piece_6a = split(chamfer1_piece_6a, bisect_by=Plane(origin=(18.645, 48.174896813, 12.835103187), z_dir=(1, 0, 0)), keep=Keep.TOP, mode=Mode.PRIVATE)
    with BuildSketch(Plane(origin=(18.645, -2.75, 13), x_dir=(0.9996219169112968, 0, 0.02749587661058555), z_dir=(0, 1, 0))) as chamfer1_piece_6b_section:
        Polygon((CHAMFER1_SIZE * 0.999621916911, CHAMFER1_SIZE * 0.0274958766106), (-CHAMFER1_SIZE * 0.0274958766106, CHAMFER1_SIZE * 0.999621916911), (0, 0), align=None)
    chamfer1_piece_6b = extrude(amount=52.045841494, mode=Mode.PRIVATE)
    chamfer1_piece_6b = split(chamfer1_piece_6b, bisect_by=Plane(origin=(18.809896813, 48.01, 12.835103187), z_dir=(0, 1, 0)), keep=Keep.TOP, mode=Mode.PRIVATE)
    chamfer1_piece_6 = chamfer1_piece_6a & chamfer1_piece_6b
    add(chamfer1_piece_6, mode=Mode.SUBTRACT)

    # Sketch18 → Cut-Extrude5 (cut)
    with BuildSketch(Plane(origin=(0, 0, 11), x_dir=(-1, 0, 0), z_dir=(0, 0, -1)).offset(CUT_EXTRUDE5_START)):
        with Locations((-20.145, 10.36)):
            Circle(SKETCH18_R)
        with Locations((-20.145, 35.76)):
            Circle(SKETCH18_R)
    extrude(amount=CUT_EXTRUDE5_DEPTH, mode=Mode.SUBTRACT)

    # Sketch19 → Cut-Extrude7 (cut)
    # profile 1 of 4: a face of its own
    with BuildSketch(Plane(origin=(0, 0, -0.75), x_dir=(-1, 0, 0), z_dir=(0, 0, -1))):
        with BuildLine():
            Line((-25.23, 50.76), (-30.29, 50.76))
            ThreePointArc((-30.29, 50.76), (-34.886194078, 48.856194078), (-36.79, 44.26))
            Line((-36.79, 44.26), (-36.79, 39.2))
            Line((-36.79, 39.2), (-30.48, 39.2))
            ThreePointArc((-30.48, 39.2), (-26.767689399, 40.737689399), (-25.23, 44.45))
            Line((-25.23, 44.45), (-25.23, 50.76))
        make_face()
        with BuildLine():
            Line((-27.23, 48.76), (-30.29, 48.76))
            ThreePointArc((-30.29, 48.76), (-33.471980515, 47.441980515), (-34.79, 44.26))
            Line((-34.79, 44.26), (-34.79, 41.2))
            Line((-34.79, 41.2), (-30.48, 41.2))
            ThreePointArc((-30.48, 41.2), (-28.181902961, 42.151902961), (-27.23, 44.45))
            Line((-27.23, 44.45), (-27.23, 48.76))
        make_face(mode=Mode.SUBTRACT)
    # profile 2 of 4: a face of its own
    with BuildSketch(Plane(origin=(0, 0, -0.75), x_dir=(-1, 0, 0), z_dir=(0, 0, -1))):
        with BuildLine():
            Line((-4, 50.76), (-9.06, 50.76))
            Line((-9.06, 50.76), (-9.06, 44.45))
            ThreePointArc((-9.06, 44.45), (-7.522310601, 40.737689399), (-3.81, 39.2))
            Line((-3.81, 39.2), (2.5, 39.2))
            Line((2.5, 39.2), (2.5, 44.26))
            ThreePointArc((2.5, 44.26), (0.596194078, 48.856194078), (-4, 50.76))
        make_face()
        with BuildLine():
            Line((-4, 48.76), (-7.06, 48.76))
            Line((-7.06, 48.76), (-7.06, 44.45))
            ThreePointArc((-7.06, 44.45), (-6.108097039, 42.151902961), (-3.81, 41.2))
            Line((-3.81, 41.2), (0.5, 41.2))
            Line((0.5, 41.2), (0.5, 44.26))
            ThreePointArc((0.5, 44.26), (-0.818019485, 47.441980515), (-4, 48.76))
        make_face(mode=Mode.SUBTRACT)
    # profile 3 of 4: a face of its own
    with BuildSketch(Plane(origin=(0, 0, -0.75), x_dir=(-1, 0, 0), z_dir=(0, 0, -1))):
        with BuildLine():
            Line((-30.29, -5.5), (-25.23, -5.5))
            Line((-25.23, -5.5), (-25.23, 3.81))
            ThreePointArc((-25.23, 3.81), (-26.767689399, 7.522310601), (-30.48, 9.06))
            Line((-30.48, 9.06), (-36.79, 9.06))
            Line((-36.79, 9.06), (-36.79, 1))
            ThreePointArc((-36.79, 1), (-34.886194078, -3.596194078), (-30.29, -5.5))
        make_face()
        with BuildLine():
            Line((-30.29, -3.5), (-27.23, -3.5))
            Line((-27.23, -3.5), (-27.23, 3.81))
            ThreePointArc((-27.23, 3.81), (-28.181902961, 6.108097039), (-30.48, 7.06))
            Line((-30.48, 7.06), (-34.79, 7.06))
            Line((-34.79, 7.06), (-34.79, 1))
            ThreePointArc((-34.79, 1), (-33.471980515, -2.181980515), (-30.29, -3.5))
        make_face(mode=Mode.SUBTRACT)
    # profile 4 of 4: a face of its own
    with BuildSketch(Plane(origin=(0, 0, -0.75), x_dir=(-1, 0, 0), z_dir=(0, 0, -1))):
        with BuildLine():
            Line((-9.06, -5.5), (-4, -5.5))
            ThreePointArc((-4, -5.5), (0.596194078, -3.596194078), (2.5, 1))
            Line((2.5, 1), (2.5, 9.06))
            Line((2.5, 9.06), (-3.81, 9.06))
            ThreePointArc((-3.81, 9.06), (-7.522310601, 7.522310601), (-9.06, 3.81))
            Line((-9.06, 3.81), (-9.06, -5.5))
        make_face()
        with BuildLine():
            Line((-7.06, -3.5), (-4, -3.5))
            ThreePointArc((-4, -3.5), (-0.818019485, -2.181980515), (0.5, 1))
            Line((0.5, 1), (0.5, 7.06))
            Line((0.5, 7.06), (-3.81, 7.06))
            ThreePointArc((-3.81, 7.06), (-6.108097039, 6.108097039), (-7.06, 3.81))
            Line((-7.06, 3.81), (-7.06, -3.5))
        make_face(mode=Mode.SUBTRACT)
    extrude(amount=-CUT_EXTRUDE7_DEPTH, mode=Mode.SUBTRACT)


solid = part.part
